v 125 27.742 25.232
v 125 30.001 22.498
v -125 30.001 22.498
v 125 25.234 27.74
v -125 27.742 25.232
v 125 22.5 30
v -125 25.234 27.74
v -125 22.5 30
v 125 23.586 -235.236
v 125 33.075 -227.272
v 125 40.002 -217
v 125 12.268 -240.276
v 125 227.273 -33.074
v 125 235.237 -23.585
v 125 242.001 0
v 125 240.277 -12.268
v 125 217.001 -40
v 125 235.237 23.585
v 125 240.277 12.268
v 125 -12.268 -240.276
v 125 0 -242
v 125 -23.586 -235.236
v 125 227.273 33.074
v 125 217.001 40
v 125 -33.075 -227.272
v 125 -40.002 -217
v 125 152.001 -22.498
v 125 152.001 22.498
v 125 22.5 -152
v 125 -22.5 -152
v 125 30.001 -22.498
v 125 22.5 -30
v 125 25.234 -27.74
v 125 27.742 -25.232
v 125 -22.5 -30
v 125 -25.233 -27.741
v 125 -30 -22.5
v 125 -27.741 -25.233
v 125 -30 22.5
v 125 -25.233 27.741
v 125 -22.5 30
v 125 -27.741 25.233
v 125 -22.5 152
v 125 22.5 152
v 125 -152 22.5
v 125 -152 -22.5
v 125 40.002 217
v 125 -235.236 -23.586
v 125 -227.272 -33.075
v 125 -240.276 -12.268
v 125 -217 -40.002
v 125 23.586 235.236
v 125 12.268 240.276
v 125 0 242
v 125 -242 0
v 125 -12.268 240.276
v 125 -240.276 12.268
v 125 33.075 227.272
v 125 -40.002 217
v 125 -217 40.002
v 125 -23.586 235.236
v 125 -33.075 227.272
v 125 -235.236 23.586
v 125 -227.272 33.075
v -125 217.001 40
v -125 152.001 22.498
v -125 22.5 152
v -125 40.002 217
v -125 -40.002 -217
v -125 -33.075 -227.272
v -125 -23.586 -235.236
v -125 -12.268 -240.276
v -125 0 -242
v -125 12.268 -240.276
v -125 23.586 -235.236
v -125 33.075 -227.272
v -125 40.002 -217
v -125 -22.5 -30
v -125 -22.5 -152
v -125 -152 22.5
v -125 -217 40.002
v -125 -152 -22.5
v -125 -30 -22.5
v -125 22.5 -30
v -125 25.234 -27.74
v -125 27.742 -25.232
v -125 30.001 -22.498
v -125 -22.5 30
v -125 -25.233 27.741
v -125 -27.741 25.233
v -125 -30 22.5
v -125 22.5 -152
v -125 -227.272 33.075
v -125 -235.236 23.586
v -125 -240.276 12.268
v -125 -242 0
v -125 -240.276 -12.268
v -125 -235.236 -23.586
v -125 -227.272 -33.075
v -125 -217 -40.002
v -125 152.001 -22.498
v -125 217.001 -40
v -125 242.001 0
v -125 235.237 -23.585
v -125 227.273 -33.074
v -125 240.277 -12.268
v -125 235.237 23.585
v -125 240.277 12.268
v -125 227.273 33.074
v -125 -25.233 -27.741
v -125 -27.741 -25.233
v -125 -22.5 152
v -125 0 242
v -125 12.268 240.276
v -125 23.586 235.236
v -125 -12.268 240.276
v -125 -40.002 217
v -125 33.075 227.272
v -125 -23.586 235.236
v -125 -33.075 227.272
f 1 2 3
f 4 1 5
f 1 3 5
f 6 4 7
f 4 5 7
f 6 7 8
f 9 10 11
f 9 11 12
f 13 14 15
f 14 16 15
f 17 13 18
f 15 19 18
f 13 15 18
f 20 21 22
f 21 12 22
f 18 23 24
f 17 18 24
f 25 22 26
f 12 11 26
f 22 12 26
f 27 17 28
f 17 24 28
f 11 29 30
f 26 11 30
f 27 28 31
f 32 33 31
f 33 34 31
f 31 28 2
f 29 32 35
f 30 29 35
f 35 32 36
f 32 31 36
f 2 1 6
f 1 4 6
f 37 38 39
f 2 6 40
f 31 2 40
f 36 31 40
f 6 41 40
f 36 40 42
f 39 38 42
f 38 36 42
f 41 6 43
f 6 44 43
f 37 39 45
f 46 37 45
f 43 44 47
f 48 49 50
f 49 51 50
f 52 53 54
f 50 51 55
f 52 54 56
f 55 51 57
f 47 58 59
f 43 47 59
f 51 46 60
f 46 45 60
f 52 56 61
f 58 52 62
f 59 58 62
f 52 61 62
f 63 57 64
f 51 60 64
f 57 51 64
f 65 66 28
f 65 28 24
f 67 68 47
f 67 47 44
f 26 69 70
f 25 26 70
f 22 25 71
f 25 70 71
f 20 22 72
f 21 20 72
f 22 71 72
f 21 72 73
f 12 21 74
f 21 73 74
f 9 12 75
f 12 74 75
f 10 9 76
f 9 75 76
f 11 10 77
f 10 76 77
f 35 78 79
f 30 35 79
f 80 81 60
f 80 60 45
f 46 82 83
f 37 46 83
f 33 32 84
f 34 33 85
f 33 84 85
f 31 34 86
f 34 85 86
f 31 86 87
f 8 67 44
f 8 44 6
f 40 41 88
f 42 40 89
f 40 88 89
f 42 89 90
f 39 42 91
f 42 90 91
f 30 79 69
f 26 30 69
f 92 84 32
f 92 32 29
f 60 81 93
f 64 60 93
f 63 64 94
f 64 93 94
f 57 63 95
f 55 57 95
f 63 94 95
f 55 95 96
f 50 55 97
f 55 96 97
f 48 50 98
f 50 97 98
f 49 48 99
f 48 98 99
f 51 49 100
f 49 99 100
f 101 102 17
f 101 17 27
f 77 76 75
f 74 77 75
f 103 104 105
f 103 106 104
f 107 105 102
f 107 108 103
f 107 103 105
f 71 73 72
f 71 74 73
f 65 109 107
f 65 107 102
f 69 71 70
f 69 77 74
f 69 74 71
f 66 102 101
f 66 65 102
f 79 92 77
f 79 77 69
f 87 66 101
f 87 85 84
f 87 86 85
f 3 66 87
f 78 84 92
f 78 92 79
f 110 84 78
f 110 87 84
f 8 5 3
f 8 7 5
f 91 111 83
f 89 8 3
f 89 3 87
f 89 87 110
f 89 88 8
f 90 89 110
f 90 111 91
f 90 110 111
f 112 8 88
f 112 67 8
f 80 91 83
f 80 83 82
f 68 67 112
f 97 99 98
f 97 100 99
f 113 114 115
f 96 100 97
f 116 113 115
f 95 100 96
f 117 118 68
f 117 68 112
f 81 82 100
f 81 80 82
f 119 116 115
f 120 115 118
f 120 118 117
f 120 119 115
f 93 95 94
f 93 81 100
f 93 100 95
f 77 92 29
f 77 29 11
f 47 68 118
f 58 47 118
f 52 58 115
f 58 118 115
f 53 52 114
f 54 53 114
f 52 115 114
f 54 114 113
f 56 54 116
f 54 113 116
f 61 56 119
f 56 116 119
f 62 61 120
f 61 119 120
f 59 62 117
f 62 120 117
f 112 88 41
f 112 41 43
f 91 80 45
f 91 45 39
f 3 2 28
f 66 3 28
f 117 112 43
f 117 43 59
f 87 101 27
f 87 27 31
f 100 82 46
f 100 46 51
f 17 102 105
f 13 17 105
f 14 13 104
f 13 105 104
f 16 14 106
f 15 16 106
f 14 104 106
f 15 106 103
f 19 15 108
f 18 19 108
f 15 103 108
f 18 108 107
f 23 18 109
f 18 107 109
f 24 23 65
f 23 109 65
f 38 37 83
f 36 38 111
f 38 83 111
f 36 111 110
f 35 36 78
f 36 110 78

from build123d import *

# Parameters (mm, degrees)
PAD_DEPTH = 250


with BuildPart() as part:
    # Sketch → Pad (new body)
    with BuildSketch(Plane.YZ.offset(-125)):
        with BuildLine():
            Line((-152, -22.5), (-217, -40.001854))
            ThreePointArc((-217, 40.001854), (-242, 0), (-217, -40.001854))
            Line((-217, 40.001854), (-152, 22.5))
            Line((-152, 22.5), (-30, 22.5))
            ThreePointArc((-22.5, 30), (-26.516504, 26.516504), (-30, 22.5))
            Line((-22.5, 30), (-22.5, 152))
            Line((-22.5, 152), (-40.001854, 217))
            ThreePointArc((40.001854, 217), (0, 242), (-40.001854, 217))
            Line((40.001854, 217), (22.5, 152))
            Line((22.5, 152), (22.5, 30))
            ThreePointArc((30.00139, 22.498146), (26.517324, 26.515685), (22.5, 30))
            Line((30.00139, 22.498146), (152.00139, 22.498146))
            Line((152.00139, 22.498146), (217.00139, 40))
            ThreePointArc((217.00139, -40), (242.00139, 0), (217.00139, 40))
            Line((217.00139, -40), (152.00139, -22.498146))
            Line((152.00139, -22.498146), (30.00139, -22.498146))
            ThreePointArc((22.5, -30), (26.517324, -26.515685), (30.00139, -22.498146))
            Line((22.5, -30), (22.5, -152))
            Line((22.5, -152), (40.001854, -217))
            ThreePointArc((-40.001854, -217), (0, -242), (40.001854, -217))
            Line((-22.5, -152), (-40.001854, -217))
            Line((-22.5, -30), (-22.5, -152))
            ThreePointArc((-30, -22.5), (-26.516504, -26.516504), (-22.5, -30))
            Line((-152, -22.5), (-30, -22.5))
        make_face()
    extrude(amount=PAD_DEPTH)


solid = part.part
